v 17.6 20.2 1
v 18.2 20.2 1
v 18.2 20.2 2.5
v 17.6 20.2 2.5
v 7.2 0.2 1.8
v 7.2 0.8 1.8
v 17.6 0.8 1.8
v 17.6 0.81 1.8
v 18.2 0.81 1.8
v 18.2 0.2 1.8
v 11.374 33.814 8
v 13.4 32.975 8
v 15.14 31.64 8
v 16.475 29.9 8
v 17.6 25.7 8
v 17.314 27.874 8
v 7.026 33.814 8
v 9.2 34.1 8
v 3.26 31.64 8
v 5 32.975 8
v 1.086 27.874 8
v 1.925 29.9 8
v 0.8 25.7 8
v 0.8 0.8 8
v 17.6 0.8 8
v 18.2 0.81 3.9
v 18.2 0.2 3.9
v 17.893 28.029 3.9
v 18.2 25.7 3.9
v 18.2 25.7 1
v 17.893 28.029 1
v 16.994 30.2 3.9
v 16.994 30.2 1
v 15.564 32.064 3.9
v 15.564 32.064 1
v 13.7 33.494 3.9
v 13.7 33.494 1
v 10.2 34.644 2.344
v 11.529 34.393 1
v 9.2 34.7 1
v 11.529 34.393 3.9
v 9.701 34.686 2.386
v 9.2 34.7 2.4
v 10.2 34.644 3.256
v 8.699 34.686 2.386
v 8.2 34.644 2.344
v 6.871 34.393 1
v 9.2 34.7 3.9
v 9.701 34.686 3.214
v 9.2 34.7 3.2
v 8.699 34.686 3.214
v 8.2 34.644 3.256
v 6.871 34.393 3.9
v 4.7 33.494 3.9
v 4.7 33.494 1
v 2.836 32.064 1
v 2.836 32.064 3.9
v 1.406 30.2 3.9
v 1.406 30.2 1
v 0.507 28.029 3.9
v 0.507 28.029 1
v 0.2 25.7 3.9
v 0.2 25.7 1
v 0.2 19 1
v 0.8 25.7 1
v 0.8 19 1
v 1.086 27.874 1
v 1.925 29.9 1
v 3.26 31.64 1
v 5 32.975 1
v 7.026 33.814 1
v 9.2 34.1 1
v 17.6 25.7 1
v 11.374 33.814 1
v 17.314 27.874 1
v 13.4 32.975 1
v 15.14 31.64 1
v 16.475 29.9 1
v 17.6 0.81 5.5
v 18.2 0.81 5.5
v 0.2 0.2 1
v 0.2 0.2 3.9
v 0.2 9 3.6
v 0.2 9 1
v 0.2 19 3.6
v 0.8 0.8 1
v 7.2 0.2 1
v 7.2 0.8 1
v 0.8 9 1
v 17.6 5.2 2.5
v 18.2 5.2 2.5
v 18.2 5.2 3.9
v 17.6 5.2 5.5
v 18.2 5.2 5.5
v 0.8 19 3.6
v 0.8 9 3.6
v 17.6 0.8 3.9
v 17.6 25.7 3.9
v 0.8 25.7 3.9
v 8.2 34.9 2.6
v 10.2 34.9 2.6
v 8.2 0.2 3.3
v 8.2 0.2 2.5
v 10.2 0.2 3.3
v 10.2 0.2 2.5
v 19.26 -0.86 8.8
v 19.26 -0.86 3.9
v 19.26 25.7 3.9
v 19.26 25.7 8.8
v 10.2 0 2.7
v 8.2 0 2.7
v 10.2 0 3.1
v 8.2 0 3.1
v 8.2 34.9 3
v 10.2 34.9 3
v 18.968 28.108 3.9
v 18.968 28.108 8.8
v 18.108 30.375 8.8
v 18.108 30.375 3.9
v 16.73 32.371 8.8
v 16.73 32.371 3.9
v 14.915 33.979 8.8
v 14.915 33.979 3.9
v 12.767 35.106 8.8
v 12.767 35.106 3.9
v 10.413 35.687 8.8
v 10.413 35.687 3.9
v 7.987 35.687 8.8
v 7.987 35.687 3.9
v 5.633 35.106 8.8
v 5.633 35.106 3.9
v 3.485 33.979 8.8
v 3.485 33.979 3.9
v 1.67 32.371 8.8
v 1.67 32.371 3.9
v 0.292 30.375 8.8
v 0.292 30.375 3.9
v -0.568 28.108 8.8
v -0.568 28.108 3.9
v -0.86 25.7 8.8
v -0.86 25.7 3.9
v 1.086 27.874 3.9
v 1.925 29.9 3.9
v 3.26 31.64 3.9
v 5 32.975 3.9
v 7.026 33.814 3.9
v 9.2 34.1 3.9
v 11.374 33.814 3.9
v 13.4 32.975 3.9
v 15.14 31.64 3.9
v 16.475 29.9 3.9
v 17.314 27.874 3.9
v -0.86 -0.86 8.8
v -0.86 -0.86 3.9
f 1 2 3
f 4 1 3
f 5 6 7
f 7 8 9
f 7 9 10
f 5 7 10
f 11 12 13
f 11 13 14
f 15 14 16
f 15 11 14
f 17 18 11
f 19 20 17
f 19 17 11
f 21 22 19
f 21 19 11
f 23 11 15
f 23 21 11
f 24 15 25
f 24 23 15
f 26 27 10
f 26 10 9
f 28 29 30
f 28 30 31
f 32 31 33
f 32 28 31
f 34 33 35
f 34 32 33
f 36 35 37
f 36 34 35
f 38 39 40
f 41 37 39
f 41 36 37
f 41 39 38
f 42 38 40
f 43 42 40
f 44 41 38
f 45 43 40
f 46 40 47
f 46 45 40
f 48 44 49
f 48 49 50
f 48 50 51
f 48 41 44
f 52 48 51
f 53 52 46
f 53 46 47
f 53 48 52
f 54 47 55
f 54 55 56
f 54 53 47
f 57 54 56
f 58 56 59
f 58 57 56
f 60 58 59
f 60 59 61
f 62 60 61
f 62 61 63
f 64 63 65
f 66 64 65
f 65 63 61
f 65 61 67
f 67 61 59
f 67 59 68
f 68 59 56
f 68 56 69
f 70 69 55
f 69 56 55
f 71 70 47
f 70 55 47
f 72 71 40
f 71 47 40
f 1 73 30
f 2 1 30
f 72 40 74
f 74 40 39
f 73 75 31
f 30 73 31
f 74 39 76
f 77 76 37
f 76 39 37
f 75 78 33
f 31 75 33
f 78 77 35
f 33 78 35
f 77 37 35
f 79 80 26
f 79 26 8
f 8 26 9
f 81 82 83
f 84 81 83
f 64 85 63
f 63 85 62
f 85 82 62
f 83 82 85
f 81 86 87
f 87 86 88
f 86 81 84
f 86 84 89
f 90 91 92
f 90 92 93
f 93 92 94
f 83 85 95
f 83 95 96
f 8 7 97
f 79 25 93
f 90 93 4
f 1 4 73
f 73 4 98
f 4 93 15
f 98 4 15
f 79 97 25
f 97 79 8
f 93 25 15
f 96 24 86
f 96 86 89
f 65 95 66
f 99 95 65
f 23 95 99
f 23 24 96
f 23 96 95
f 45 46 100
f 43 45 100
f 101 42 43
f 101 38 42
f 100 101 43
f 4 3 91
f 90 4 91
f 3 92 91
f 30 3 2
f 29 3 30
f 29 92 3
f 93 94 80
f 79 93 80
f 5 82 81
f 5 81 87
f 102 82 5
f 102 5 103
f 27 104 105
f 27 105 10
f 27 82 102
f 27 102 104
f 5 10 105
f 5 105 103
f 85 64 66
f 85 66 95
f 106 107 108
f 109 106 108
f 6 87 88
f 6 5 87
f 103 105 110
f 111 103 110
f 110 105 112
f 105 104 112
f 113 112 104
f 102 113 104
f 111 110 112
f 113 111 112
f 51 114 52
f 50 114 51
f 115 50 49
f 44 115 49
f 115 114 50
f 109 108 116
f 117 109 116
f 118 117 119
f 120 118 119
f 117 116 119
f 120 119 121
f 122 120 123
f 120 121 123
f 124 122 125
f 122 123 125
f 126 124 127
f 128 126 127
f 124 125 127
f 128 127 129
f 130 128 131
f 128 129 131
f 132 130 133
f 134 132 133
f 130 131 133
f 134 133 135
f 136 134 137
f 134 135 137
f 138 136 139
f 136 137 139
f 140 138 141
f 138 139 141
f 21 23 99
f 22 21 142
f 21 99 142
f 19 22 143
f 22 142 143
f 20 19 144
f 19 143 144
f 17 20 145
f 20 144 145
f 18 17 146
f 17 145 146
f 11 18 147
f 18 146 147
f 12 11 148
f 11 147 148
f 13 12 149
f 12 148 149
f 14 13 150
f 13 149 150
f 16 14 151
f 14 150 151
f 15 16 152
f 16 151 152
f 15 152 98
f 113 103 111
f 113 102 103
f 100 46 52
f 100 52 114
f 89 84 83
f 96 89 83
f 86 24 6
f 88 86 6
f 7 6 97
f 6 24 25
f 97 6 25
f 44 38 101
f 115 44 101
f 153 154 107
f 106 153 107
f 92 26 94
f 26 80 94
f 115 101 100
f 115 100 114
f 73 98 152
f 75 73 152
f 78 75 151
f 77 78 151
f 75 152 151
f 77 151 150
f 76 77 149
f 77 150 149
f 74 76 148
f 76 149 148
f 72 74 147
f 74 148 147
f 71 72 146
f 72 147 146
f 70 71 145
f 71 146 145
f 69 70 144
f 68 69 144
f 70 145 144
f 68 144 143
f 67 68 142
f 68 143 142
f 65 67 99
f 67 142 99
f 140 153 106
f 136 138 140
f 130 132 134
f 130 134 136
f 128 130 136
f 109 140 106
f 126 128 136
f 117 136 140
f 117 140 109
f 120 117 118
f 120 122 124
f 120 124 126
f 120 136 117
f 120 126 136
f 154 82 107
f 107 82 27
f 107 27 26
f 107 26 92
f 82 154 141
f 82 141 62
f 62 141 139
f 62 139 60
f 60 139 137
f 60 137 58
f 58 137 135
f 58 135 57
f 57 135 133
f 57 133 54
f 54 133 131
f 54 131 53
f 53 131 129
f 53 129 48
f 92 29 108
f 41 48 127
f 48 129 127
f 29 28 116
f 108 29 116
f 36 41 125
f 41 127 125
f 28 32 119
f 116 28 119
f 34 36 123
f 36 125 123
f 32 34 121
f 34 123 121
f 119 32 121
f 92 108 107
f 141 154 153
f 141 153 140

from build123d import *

# Parameters (mm, degrees)
PAD002_DEPTH    = 2.9
PAD003_DEPTH    = 4.9
POCKET005_DEPTH = 4.1
POCKET006_DEPTH = 11
SKETCH011_W     = 10
SKETCH011_H     = 3.6
POCKET007_DEPTH = 5
PAD004_DEPTH    = 2


with BuildPart() as part:
    # Sketch008 (on Face1 of ReferencePocket001) → Pad002 (new body)
    with BuildSketch(Plane.XY.offset(3.9)):
        with BuildLine():
            Line((0.2, 0.2), (18.2000000001, 0.2))
            Line((18.2000000001, 0.2), (18.2000000001, 25.6999686791))
            ThreePointArc((18.2000000001, 25.6999686791), (9.2000000001, 34.6999686791), (0.2, 25.6999686791))
            Line((0.2, 0.2), (0.2, 25.6999686791))
        make_face()
        with BuildLine():
            Line((0.8, 0.8), (17.6000000001, 0.8))
            Line((17.6000000001, 0.8), (17.6000000001, 25.6999686791))
            ThreePointArc((17.6000000001, 25.6999686791), (9.2000000001, 34.0999686791), (0.8, 25.6999686791))
            Line((0.8, 0.8), (0.8, 25.6999686791))
        make_face(mode=Mode.SUBTRACT)
    extrude(amount=-PAD002_DEPTH)

    # Sketch009 (on Face9 of Pad002) → Pad003 (join)
    with BuildSketch(Plane.XY.offset(3.9)):
        with BuildLine():
            Line((-0.86, -0.86), (19.26, -0.86))
            Line((19.26, -0.86), (19.26, 25.7000002895))
            ThreePointArc((19.26, 25.7000002895), (9.1999999842, 35.7600002578), (-0.86, 25.7000002578))
            Line((-0.86, -0.86), (-0.86, 25.7000002578))
        make_face()
    extrude(amount=PAD003_DEPTH)

    # Pad003 Face16 → Pocket005 (cut)
    with BuildSketch(Plane(origin=(9.2000000001, 16.6044557437, 3.9), x_dir=(0, -1, 0), z_dir=(0, 0, -1))):
        with BuildLine():
            Line((15.8044557437, 8.4000000001), (-9.0955129353, 8.4000000001))
            ThreePointArc((-9.0955129353, 8.4000000001), (-17.4955129354, 0), (-9.0955129353, -8.4000000001))
            Line((-9.0955129353, -8.4000000001), (15.8044557437, -8.4000000001))
            Line((15.8044557437, -8.4000000001), (15.8044557437, 8.4000000001))
        make_face()
    extrude(amount=-POCKET005_DEPTH, mode=Mode.SUBTRACT)

    # Sketch010 (on Face8 of Pocket005) → Pocket006 (cut)
    with BuildSketch(Plane.YZ.offset(18.2000000001)):
        Polygon((0.81, 1), (5.2, 1), (20.2, 1), (20.2, 2.5), (5.2, 2.5), (5.2, 5.5), (0.81, 5.5), (0.81, 1.8), (0.2, 1.8), (0.2, 1), align=None)
    extrude(amount=-POCKET006_DEPTH, mode=Mode.SUBTRACT)

    # Sketch011 (on Face12 of Pocket006) → Pocket007 (cut)
    with BuildSketch(Plane(origin=(0.2, 0, 0), x_dir=(0, -1, 0), z_dir=(-1, 0, 0))):
        with Locations((-14, 1.8)):
            Rectangle(SKETCH011_W, SKETCH011_H)
    extrude(amount=-POCKET007_DEPTH, mode=Mode.SUBTRACT)

    # Sketch012 (on Face12 of Pocket007) → Pad004 (join)
    with BuildSketch(Plane(origin=(10.2, 0, 0), x_dir=(0, -1, 0), z_dir=(-1, 0, 0))):
        Polygon((-0.2, 2.5), (0, 2.7), (0, 3.1), (-0.2, 3.3), align=None)
        Polygon((-34.8999686791, 2.6), (-34.8999686791, 3), (-34.4999686791, 3.4), (-34.4999686791, 2.2), align=None)
    extrude(amount=PAD004_DEPTH)


solid = part.part
